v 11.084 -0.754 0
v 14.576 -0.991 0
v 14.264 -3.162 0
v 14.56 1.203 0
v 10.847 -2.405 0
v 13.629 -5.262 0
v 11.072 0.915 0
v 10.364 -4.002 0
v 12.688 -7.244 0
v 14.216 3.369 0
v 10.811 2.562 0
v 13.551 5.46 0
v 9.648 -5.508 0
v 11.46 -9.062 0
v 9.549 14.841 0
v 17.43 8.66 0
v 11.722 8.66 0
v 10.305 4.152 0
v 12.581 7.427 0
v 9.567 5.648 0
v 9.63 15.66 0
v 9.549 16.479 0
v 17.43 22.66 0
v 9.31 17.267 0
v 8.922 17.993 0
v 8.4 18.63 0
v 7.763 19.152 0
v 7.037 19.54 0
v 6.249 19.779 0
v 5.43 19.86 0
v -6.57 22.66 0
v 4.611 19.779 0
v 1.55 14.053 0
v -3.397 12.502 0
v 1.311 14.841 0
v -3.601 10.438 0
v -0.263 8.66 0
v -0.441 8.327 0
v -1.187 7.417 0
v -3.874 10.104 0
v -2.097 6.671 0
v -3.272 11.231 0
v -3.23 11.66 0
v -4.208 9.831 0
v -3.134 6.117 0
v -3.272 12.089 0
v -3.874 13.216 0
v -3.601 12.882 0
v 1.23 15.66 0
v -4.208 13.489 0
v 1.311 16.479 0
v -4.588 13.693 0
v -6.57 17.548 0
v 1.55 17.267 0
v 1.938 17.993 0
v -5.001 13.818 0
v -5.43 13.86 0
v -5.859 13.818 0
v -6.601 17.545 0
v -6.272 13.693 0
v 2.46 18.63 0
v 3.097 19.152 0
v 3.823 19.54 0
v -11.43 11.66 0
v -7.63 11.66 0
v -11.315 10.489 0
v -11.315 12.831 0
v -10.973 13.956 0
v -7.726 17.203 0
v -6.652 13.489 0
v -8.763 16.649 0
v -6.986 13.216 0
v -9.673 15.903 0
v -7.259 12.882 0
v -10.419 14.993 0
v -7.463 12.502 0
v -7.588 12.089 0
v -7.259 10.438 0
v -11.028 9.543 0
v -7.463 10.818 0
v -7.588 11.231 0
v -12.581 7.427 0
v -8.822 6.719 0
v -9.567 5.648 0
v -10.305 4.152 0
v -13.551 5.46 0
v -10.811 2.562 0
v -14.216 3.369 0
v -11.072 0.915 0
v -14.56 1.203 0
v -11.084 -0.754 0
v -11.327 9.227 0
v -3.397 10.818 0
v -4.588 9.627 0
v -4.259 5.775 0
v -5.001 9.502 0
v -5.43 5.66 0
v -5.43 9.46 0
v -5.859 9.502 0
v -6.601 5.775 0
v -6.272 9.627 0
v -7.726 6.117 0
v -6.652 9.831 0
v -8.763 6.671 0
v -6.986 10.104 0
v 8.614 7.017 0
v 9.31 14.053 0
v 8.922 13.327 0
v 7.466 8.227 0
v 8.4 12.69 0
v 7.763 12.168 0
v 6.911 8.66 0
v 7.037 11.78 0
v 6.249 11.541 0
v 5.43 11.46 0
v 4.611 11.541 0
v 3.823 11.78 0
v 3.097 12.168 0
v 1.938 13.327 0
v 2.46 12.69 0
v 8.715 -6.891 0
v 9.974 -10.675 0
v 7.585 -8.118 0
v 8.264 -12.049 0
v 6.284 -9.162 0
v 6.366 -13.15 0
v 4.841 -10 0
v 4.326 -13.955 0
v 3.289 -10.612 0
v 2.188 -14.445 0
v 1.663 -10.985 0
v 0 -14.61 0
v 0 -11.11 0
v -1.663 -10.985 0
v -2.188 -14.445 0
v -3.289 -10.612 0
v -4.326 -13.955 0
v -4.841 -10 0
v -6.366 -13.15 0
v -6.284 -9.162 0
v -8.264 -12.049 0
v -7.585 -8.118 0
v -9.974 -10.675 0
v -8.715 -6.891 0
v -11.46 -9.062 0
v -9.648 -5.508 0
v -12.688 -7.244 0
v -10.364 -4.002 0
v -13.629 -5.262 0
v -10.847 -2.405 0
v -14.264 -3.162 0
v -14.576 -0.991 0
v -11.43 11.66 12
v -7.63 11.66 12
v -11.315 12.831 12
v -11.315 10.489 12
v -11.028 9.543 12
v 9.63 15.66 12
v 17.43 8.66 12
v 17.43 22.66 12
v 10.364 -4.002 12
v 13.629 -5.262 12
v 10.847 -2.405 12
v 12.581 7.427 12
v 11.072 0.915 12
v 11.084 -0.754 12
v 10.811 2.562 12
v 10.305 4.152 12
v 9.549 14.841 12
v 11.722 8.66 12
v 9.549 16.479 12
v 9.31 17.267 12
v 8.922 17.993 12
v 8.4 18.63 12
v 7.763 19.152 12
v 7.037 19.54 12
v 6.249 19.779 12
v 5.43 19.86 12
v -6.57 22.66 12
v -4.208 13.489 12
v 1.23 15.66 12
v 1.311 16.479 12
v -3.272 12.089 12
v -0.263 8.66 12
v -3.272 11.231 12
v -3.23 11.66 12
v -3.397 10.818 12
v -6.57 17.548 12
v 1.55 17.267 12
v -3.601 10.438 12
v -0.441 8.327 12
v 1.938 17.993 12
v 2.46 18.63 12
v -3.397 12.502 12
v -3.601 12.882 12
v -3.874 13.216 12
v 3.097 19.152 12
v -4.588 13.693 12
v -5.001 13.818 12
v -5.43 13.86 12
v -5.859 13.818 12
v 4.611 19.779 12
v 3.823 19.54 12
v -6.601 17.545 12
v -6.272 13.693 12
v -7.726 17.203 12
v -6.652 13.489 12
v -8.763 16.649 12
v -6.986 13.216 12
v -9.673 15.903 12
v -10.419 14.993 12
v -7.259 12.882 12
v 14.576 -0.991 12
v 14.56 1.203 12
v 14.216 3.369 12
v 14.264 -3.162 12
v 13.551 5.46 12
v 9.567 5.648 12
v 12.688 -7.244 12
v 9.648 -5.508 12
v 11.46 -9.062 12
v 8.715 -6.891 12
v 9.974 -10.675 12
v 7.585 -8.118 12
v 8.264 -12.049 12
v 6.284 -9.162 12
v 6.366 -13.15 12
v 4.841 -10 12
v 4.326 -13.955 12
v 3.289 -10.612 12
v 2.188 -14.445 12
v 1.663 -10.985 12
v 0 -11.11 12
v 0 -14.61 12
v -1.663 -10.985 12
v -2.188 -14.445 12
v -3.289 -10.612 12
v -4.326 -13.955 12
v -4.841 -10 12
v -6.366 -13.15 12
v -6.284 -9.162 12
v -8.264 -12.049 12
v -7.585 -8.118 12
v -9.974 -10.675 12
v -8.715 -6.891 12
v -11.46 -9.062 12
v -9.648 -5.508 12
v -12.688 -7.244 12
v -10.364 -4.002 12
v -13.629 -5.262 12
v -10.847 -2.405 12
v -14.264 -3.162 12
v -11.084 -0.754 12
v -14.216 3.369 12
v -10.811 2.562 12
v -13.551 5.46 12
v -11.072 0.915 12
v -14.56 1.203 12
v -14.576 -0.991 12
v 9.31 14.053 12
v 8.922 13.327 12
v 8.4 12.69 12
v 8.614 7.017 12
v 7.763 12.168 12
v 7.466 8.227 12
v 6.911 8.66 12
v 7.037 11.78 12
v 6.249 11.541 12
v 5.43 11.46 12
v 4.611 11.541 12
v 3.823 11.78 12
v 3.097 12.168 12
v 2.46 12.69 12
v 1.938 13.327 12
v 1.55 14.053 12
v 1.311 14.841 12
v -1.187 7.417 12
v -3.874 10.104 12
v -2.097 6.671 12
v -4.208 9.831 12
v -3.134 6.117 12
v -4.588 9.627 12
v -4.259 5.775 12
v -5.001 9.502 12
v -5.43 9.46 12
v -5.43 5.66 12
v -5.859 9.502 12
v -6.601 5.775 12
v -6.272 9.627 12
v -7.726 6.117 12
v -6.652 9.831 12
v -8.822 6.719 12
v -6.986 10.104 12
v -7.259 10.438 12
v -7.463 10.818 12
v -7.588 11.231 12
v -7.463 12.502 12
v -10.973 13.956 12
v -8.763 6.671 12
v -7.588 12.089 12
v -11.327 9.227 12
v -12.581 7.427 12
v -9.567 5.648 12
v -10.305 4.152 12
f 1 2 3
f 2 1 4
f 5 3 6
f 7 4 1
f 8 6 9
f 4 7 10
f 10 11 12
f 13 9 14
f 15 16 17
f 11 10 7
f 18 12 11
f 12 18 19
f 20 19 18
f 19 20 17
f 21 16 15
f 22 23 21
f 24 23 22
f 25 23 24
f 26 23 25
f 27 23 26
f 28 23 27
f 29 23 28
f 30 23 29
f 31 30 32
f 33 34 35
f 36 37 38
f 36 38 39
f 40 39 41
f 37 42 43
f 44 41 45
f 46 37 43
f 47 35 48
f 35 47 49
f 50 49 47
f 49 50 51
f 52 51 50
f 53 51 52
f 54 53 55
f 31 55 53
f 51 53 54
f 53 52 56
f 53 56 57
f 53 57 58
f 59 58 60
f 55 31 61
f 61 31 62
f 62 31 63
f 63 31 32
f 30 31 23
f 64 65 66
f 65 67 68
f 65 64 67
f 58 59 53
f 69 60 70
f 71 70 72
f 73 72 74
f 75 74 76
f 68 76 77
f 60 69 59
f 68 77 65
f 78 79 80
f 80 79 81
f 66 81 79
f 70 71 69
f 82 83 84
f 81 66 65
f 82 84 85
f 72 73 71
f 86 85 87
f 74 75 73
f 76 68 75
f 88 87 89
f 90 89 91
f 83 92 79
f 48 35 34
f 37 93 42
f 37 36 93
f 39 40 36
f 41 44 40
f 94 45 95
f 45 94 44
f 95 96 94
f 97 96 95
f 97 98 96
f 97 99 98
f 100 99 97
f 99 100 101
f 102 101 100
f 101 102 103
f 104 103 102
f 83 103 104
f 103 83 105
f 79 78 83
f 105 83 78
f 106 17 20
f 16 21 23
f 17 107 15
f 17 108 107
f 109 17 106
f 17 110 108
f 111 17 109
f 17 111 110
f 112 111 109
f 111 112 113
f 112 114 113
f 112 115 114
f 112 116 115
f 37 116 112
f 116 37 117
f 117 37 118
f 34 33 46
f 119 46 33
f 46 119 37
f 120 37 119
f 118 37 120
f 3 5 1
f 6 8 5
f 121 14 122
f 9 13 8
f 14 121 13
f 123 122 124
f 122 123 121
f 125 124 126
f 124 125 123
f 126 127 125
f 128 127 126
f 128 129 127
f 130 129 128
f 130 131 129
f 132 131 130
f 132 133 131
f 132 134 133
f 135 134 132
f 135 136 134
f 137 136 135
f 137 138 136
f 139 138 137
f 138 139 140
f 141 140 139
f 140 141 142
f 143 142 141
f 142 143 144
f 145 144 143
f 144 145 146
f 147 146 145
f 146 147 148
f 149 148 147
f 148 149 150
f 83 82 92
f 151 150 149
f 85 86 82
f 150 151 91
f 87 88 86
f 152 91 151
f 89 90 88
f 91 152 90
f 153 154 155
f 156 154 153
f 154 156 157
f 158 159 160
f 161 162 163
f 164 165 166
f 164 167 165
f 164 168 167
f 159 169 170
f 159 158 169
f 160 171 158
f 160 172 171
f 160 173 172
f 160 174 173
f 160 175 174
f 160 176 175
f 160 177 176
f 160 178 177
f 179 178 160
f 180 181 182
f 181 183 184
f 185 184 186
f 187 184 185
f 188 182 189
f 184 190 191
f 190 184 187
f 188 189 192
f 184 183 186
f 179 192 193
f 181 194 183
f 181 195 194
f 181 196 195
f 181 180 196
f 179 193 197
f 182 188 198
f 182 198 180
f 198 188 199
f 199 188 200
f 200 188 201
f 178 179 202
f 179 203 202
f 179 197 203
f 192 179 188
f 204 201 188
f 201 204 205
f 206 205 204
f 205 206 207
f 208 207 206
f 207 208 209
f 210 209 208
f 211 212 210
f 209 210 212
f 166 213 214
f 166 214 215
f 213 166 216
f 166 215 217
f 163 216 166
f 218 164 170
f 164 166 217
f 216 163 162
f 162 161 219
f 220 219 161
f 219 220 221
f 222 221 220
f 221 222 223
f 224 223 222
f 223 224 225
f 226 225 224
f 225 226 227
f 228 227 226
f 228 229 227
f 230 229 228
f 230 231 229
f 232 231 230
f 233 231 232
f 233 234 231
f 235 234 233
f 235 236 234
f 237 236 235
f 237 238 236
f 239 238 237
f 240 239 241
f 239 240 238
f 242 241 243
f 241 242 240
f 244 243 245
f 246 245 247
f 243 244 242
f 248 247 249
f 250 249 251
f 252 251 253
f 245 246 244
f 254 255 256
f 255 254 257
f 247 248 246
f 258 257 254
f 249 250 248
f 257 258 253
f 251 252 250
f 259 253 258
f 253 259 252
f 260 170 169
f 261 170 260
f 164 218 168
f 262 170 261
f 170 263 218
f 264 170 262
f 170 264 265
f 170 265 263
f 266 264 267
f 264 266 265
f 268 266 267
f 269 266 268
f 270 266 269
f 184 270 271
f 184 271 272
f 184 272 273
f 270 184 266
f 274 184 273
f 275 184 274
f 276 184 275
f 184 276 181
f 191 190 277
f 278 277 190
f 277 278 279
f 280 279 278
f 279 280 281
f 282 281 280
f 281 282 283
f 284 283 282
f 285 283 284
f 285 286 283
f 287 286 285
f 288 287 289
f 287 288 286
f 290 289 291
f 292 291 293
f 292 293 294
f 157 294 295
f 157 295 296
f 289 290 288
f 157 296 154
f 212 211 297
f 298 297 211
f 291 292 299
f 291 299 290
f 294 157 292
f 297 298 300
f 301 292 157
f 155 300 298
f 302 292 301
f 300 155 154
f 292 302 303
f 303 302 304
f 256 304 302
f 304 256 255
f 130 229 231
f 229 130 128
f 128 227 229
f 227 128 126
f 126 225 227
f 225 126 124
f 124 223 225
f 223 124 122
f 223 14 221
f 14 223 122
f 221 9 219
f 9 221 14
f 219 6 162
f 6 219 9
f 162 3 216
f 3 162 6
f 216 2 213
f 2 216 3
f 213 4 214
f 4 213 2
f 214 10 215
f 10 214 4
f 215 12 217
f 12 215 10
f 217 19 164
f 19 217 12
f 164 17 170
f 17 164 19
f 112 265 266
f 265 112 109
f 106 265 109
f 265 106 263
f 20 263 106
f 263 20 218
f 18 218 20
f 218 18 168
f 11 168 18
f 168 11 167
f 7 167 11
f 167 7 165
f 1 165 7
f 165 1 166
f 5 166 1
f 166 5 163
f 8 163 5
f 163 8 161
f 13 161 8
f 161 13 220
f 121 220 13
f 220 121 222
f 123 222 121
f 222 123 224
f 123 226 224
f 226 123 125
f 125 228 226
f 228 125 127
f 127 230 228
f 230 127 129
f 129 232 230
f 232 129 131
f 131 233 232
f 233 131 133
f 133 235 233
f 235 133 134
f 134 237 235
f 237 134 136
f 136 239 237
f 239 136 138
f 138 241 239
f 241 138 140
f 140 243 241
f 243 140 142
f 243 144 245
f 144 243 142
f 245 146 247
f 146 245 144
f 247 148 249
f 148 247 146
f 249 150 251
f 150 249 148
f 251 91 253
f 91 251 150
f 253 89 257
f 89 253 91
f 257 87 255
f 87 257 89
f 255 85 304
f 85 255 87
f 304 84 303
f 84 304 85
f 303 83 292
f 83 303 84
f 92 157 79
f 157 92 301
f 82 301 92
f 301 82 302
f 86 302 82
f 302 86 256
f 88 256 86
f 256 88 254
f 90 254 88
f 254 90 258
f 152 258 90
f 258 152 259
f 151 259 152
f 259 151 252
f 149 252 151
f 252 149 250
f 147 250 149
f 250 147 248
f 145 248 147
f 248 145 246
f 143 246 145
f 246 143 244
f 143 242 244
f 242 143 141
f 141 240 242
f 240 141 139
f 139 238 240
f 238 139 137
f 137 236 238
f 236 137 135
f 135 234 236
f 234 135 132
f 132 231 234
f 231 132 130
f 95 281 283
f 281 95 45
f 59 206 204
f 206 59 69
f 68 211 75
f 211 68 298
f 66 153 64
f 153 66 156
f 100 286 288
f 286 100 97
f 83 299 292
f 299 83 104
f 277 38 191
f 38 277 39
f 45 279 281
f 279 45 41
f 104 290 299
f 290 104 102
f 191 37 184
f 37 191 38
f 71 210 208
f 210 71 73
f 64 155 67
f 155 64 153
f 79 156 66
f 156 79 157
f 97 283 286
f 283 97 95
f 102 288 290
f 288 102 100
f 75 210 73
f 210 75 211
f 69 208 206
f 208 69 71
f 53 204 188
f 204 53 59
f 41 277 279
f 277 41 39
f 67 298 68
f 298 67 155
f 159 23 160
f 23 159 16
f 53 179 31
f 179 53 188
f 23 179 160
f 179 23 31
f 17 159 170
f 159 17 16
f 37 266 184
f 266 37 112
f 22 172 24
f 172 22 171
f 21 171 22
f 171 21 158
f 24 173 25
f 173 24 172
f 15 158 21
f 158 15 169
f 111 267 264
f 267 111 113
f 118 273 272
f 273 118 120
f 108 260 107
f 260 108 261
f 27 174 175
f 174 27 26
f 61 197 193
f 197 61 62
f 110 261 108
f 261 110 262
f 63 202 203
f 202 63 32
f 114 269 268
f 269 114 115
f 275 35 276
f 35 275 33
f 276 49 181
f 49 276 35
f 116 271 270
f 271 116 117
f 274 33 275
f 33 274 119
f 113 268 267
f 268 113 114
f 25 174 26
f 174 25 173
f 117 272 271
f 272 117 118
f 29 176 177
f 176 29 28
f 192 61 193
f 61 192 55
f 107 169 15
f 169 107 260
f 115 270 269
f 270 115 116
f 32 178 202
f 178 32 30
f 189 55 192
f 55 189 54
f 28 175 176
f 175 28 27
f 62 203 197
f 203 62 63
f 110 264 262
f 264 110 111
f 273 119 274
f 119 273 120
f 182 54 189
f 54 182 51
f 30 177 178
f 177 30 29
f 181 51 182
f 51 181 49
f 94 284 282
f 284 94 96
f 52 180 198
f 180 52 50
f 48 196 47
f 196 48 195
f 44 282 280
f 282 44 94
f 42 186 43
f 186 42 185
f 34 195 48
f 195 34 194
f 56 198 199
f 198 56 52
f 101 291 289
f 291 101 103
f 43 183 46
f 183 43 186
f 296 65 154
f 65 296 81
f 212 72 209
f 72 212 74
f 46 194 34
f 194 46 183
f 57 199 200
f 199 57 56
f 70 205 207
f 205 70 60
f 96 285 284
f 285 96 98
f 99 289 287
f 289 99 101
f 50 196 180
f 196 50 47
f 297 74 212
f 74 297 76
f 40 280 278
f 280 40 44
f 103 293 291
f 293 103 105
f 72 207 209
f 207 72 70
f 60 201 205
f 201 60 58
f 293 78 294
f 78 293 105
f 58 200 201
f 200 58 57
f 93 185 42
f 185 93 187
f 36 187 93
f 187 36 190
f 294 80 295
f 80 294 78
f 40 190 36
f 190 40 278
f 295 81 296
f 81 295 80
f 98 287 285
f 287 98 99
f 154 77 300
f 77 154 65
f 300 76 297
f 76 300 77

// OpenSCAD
$fn = 32;

// ----------------------------------------------------------------------
// Pipe clamp: 29.22 mm ring, 3.5 mm wall, 12 mm wide
// ----------------------------------------------------------------------

// --- parameters (mm) ---
outer_r = 14.61;          // clamp outside radius
inner_r = 11.11;          // pipe bore radius
band = 3.5;               // band thickness
clamp_w = 12;             // clamp width
opening = 50;             // opening angle between the ends
lug_w = 24;               // lug width
lug_len = 14;             // lug length
bolt_d = 8.4;             // bolt hole
knuckle_d = 12;           // hinge knuckle diameter
pin_d = 4.4;              // hinge pin hole

clamp_profile = [[-6.174, 13.241], [-8.087, 12.167], [-9.818, 10.819], [-11.327, 9.227], [-12.581, 7.427], [-13.551, 5.46], [-14.216, 3.369], [-14.56, 1.203], [-14.576, -0.991], [-14.264, -3.162], [-13.629, -5.262], [-12.688, -7.244], [-11.46, -9.062], [-9.974, -10.675], [-8.264, -12.049], [-6.366, -13.15], [-4.326, -13.955], [-2.188, -14.445], [0, -14.61], [2.188, -14.445], [4.326, -13.955], [6.366, -13.15], [8.264, -12.049], [9.974, -10.675], [11.46, -9.062], [12.688, -7.244], [13.629, -5.262], [14.264, -3.162], [14.576, -0.991], [14.56, 1.203], [14.216, 3.369], [13.551, 5.46], [12.581, 7.427], [11.327, 9.227], [9.818, 10.819], [8.087, 12.167], [6.174, 13.241], [4.695, 10.069], [6.15, 9.253], [7.466, 8.227], [8.614, 7.017], [9.567, 5.648], [10.305, 4.152], [10.811, 2.562], [11.072, 0.915], [11.084, -0.754], [10.847, -2.405], [10.364, -4.002], [9.648, -5.508], [8.715, -6.891], [7.585, -8.118], [6.284, -9.162], [4.841, -10], [3.289, -10.612], [1.663, -10.985], [0, -11.11], [-1.663, -10.985], [-3.289, -10.612], [-4.841, -10], [-6.284, -9.162], [-7.585, -8.118], [-8.715, -6.891], [-9.648, -5.508], [-10.364, -4.002], [-10.847, -2.405], [-11.084, -0.754], [-11.072, 0.915], [-10.811, 2.562], [-10.305, 4.152], [-9.567, 5.648], [-8.614, 7.017], [-7.466, 8.227], [-6.15, 9.253], [-4.695, 10.069]];

difference() {
  union() {
    linear_extrude(height = clamp_w) polygon(clamp_profile);
    /* hinge knuckle, sunk 2 mm into the band end */
    translate([-5.43, 11.66, 0]) cylinder(h = clamp_w, d = knuckle_d);
    /* bolt lug on the other end */
    translate([-6.57, 8.66, 0]) cube([lug_w, 14, clamp_w]);
  }
  translate([5.43, 15.66, -2.5]) cylinder(h = clamp_w + 5, d = bolt_d);
  translate([-5.43, 11.66, -2.5]) cylinder(h = clamp_w + 5, d = pin_d);
}
